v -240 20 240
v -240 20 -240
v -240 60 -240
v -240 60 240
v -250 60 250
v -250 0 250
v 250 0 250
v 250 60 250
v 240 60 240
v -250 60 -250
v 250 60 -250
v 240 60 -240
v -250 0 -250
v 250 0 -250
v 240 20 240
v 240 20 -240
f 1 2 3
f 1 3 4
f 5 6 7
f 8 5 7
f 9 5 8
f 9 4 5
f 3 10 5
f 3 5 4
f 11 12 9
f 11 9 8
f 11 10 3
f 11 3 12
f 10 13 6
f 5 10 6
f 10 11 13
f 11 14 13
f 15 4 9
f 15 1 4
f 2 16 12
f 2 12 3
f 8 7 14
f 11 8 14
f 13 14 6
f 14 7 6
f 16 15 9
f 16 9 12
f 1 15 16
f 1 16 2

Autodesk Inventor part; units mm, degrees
ref_plane "YZ Plane" through (0, 0, 0) normal (1, 0, 0) x (0, 1, 0)
ref_plane "XZ Plane" through (0, 0, 0) normal (0, 1, 0) x (-1, 0, 0)
ref_plane "XY Plane" through (0, 0, 0) normal (0, 0, 1) x (1, 0, 0)
sketch "Эскиз1" plane through (0, 0, 0) normal (0, 1, 0) x (-1, 0, 0)
  line L0 (-250, -250) -> (250, -250)
  line L1 (250, -250) -> (250, 250)
  line L2 (250, 250) -> (-250, 250)
  line L3 (-250, 250) -> (-250, -250)
  line L4 (-250, -250) -> (250, 250) construction
  line L5 (250, -250) -> (-250, 250) construction
  point P0 (0, 0)
  dimension "d0" = 500
  dimension "d1" = 500
extrude "Выдавливание1" add sketch "Эскиз1" along normal blind 20
sketch "Эскиз2" plane through (0, 20, 0) normal (0, 1, 0) x (1, 0, 0)
  line L0 (-250, 250) -> (-250, -250) projected
  line L1 (250, 250) -> (-250, 250)
  line L2 (-250, 250) -> (-250, -250)
  line L3 (-250, -250) -> (250, -250)
  line L4 (250, -250) -> (250, 250)
  line L5 (250, 250) -> (-250, -250) construction
  line L6 (-250, 250) -> (250, -250) construction
  line L7 (240, 240) -> (-240, 240)
  line L8 (-240, 240) -> (-240, -240)
  line L9 (-240, -240) -> (240, -240)
  line L10 (240, -240) -> (240, 240)
  line L11 (240, 240) -> (-240, -240) construction
  line L12 (-240, 240) -> (240, -240) construction
  point P0 (0, 0)
  dimension "d4" = 480
  dimension "d5" = 480
extrude "Выдавливание2" add sketch "Эскиз2" along normal blind 40
